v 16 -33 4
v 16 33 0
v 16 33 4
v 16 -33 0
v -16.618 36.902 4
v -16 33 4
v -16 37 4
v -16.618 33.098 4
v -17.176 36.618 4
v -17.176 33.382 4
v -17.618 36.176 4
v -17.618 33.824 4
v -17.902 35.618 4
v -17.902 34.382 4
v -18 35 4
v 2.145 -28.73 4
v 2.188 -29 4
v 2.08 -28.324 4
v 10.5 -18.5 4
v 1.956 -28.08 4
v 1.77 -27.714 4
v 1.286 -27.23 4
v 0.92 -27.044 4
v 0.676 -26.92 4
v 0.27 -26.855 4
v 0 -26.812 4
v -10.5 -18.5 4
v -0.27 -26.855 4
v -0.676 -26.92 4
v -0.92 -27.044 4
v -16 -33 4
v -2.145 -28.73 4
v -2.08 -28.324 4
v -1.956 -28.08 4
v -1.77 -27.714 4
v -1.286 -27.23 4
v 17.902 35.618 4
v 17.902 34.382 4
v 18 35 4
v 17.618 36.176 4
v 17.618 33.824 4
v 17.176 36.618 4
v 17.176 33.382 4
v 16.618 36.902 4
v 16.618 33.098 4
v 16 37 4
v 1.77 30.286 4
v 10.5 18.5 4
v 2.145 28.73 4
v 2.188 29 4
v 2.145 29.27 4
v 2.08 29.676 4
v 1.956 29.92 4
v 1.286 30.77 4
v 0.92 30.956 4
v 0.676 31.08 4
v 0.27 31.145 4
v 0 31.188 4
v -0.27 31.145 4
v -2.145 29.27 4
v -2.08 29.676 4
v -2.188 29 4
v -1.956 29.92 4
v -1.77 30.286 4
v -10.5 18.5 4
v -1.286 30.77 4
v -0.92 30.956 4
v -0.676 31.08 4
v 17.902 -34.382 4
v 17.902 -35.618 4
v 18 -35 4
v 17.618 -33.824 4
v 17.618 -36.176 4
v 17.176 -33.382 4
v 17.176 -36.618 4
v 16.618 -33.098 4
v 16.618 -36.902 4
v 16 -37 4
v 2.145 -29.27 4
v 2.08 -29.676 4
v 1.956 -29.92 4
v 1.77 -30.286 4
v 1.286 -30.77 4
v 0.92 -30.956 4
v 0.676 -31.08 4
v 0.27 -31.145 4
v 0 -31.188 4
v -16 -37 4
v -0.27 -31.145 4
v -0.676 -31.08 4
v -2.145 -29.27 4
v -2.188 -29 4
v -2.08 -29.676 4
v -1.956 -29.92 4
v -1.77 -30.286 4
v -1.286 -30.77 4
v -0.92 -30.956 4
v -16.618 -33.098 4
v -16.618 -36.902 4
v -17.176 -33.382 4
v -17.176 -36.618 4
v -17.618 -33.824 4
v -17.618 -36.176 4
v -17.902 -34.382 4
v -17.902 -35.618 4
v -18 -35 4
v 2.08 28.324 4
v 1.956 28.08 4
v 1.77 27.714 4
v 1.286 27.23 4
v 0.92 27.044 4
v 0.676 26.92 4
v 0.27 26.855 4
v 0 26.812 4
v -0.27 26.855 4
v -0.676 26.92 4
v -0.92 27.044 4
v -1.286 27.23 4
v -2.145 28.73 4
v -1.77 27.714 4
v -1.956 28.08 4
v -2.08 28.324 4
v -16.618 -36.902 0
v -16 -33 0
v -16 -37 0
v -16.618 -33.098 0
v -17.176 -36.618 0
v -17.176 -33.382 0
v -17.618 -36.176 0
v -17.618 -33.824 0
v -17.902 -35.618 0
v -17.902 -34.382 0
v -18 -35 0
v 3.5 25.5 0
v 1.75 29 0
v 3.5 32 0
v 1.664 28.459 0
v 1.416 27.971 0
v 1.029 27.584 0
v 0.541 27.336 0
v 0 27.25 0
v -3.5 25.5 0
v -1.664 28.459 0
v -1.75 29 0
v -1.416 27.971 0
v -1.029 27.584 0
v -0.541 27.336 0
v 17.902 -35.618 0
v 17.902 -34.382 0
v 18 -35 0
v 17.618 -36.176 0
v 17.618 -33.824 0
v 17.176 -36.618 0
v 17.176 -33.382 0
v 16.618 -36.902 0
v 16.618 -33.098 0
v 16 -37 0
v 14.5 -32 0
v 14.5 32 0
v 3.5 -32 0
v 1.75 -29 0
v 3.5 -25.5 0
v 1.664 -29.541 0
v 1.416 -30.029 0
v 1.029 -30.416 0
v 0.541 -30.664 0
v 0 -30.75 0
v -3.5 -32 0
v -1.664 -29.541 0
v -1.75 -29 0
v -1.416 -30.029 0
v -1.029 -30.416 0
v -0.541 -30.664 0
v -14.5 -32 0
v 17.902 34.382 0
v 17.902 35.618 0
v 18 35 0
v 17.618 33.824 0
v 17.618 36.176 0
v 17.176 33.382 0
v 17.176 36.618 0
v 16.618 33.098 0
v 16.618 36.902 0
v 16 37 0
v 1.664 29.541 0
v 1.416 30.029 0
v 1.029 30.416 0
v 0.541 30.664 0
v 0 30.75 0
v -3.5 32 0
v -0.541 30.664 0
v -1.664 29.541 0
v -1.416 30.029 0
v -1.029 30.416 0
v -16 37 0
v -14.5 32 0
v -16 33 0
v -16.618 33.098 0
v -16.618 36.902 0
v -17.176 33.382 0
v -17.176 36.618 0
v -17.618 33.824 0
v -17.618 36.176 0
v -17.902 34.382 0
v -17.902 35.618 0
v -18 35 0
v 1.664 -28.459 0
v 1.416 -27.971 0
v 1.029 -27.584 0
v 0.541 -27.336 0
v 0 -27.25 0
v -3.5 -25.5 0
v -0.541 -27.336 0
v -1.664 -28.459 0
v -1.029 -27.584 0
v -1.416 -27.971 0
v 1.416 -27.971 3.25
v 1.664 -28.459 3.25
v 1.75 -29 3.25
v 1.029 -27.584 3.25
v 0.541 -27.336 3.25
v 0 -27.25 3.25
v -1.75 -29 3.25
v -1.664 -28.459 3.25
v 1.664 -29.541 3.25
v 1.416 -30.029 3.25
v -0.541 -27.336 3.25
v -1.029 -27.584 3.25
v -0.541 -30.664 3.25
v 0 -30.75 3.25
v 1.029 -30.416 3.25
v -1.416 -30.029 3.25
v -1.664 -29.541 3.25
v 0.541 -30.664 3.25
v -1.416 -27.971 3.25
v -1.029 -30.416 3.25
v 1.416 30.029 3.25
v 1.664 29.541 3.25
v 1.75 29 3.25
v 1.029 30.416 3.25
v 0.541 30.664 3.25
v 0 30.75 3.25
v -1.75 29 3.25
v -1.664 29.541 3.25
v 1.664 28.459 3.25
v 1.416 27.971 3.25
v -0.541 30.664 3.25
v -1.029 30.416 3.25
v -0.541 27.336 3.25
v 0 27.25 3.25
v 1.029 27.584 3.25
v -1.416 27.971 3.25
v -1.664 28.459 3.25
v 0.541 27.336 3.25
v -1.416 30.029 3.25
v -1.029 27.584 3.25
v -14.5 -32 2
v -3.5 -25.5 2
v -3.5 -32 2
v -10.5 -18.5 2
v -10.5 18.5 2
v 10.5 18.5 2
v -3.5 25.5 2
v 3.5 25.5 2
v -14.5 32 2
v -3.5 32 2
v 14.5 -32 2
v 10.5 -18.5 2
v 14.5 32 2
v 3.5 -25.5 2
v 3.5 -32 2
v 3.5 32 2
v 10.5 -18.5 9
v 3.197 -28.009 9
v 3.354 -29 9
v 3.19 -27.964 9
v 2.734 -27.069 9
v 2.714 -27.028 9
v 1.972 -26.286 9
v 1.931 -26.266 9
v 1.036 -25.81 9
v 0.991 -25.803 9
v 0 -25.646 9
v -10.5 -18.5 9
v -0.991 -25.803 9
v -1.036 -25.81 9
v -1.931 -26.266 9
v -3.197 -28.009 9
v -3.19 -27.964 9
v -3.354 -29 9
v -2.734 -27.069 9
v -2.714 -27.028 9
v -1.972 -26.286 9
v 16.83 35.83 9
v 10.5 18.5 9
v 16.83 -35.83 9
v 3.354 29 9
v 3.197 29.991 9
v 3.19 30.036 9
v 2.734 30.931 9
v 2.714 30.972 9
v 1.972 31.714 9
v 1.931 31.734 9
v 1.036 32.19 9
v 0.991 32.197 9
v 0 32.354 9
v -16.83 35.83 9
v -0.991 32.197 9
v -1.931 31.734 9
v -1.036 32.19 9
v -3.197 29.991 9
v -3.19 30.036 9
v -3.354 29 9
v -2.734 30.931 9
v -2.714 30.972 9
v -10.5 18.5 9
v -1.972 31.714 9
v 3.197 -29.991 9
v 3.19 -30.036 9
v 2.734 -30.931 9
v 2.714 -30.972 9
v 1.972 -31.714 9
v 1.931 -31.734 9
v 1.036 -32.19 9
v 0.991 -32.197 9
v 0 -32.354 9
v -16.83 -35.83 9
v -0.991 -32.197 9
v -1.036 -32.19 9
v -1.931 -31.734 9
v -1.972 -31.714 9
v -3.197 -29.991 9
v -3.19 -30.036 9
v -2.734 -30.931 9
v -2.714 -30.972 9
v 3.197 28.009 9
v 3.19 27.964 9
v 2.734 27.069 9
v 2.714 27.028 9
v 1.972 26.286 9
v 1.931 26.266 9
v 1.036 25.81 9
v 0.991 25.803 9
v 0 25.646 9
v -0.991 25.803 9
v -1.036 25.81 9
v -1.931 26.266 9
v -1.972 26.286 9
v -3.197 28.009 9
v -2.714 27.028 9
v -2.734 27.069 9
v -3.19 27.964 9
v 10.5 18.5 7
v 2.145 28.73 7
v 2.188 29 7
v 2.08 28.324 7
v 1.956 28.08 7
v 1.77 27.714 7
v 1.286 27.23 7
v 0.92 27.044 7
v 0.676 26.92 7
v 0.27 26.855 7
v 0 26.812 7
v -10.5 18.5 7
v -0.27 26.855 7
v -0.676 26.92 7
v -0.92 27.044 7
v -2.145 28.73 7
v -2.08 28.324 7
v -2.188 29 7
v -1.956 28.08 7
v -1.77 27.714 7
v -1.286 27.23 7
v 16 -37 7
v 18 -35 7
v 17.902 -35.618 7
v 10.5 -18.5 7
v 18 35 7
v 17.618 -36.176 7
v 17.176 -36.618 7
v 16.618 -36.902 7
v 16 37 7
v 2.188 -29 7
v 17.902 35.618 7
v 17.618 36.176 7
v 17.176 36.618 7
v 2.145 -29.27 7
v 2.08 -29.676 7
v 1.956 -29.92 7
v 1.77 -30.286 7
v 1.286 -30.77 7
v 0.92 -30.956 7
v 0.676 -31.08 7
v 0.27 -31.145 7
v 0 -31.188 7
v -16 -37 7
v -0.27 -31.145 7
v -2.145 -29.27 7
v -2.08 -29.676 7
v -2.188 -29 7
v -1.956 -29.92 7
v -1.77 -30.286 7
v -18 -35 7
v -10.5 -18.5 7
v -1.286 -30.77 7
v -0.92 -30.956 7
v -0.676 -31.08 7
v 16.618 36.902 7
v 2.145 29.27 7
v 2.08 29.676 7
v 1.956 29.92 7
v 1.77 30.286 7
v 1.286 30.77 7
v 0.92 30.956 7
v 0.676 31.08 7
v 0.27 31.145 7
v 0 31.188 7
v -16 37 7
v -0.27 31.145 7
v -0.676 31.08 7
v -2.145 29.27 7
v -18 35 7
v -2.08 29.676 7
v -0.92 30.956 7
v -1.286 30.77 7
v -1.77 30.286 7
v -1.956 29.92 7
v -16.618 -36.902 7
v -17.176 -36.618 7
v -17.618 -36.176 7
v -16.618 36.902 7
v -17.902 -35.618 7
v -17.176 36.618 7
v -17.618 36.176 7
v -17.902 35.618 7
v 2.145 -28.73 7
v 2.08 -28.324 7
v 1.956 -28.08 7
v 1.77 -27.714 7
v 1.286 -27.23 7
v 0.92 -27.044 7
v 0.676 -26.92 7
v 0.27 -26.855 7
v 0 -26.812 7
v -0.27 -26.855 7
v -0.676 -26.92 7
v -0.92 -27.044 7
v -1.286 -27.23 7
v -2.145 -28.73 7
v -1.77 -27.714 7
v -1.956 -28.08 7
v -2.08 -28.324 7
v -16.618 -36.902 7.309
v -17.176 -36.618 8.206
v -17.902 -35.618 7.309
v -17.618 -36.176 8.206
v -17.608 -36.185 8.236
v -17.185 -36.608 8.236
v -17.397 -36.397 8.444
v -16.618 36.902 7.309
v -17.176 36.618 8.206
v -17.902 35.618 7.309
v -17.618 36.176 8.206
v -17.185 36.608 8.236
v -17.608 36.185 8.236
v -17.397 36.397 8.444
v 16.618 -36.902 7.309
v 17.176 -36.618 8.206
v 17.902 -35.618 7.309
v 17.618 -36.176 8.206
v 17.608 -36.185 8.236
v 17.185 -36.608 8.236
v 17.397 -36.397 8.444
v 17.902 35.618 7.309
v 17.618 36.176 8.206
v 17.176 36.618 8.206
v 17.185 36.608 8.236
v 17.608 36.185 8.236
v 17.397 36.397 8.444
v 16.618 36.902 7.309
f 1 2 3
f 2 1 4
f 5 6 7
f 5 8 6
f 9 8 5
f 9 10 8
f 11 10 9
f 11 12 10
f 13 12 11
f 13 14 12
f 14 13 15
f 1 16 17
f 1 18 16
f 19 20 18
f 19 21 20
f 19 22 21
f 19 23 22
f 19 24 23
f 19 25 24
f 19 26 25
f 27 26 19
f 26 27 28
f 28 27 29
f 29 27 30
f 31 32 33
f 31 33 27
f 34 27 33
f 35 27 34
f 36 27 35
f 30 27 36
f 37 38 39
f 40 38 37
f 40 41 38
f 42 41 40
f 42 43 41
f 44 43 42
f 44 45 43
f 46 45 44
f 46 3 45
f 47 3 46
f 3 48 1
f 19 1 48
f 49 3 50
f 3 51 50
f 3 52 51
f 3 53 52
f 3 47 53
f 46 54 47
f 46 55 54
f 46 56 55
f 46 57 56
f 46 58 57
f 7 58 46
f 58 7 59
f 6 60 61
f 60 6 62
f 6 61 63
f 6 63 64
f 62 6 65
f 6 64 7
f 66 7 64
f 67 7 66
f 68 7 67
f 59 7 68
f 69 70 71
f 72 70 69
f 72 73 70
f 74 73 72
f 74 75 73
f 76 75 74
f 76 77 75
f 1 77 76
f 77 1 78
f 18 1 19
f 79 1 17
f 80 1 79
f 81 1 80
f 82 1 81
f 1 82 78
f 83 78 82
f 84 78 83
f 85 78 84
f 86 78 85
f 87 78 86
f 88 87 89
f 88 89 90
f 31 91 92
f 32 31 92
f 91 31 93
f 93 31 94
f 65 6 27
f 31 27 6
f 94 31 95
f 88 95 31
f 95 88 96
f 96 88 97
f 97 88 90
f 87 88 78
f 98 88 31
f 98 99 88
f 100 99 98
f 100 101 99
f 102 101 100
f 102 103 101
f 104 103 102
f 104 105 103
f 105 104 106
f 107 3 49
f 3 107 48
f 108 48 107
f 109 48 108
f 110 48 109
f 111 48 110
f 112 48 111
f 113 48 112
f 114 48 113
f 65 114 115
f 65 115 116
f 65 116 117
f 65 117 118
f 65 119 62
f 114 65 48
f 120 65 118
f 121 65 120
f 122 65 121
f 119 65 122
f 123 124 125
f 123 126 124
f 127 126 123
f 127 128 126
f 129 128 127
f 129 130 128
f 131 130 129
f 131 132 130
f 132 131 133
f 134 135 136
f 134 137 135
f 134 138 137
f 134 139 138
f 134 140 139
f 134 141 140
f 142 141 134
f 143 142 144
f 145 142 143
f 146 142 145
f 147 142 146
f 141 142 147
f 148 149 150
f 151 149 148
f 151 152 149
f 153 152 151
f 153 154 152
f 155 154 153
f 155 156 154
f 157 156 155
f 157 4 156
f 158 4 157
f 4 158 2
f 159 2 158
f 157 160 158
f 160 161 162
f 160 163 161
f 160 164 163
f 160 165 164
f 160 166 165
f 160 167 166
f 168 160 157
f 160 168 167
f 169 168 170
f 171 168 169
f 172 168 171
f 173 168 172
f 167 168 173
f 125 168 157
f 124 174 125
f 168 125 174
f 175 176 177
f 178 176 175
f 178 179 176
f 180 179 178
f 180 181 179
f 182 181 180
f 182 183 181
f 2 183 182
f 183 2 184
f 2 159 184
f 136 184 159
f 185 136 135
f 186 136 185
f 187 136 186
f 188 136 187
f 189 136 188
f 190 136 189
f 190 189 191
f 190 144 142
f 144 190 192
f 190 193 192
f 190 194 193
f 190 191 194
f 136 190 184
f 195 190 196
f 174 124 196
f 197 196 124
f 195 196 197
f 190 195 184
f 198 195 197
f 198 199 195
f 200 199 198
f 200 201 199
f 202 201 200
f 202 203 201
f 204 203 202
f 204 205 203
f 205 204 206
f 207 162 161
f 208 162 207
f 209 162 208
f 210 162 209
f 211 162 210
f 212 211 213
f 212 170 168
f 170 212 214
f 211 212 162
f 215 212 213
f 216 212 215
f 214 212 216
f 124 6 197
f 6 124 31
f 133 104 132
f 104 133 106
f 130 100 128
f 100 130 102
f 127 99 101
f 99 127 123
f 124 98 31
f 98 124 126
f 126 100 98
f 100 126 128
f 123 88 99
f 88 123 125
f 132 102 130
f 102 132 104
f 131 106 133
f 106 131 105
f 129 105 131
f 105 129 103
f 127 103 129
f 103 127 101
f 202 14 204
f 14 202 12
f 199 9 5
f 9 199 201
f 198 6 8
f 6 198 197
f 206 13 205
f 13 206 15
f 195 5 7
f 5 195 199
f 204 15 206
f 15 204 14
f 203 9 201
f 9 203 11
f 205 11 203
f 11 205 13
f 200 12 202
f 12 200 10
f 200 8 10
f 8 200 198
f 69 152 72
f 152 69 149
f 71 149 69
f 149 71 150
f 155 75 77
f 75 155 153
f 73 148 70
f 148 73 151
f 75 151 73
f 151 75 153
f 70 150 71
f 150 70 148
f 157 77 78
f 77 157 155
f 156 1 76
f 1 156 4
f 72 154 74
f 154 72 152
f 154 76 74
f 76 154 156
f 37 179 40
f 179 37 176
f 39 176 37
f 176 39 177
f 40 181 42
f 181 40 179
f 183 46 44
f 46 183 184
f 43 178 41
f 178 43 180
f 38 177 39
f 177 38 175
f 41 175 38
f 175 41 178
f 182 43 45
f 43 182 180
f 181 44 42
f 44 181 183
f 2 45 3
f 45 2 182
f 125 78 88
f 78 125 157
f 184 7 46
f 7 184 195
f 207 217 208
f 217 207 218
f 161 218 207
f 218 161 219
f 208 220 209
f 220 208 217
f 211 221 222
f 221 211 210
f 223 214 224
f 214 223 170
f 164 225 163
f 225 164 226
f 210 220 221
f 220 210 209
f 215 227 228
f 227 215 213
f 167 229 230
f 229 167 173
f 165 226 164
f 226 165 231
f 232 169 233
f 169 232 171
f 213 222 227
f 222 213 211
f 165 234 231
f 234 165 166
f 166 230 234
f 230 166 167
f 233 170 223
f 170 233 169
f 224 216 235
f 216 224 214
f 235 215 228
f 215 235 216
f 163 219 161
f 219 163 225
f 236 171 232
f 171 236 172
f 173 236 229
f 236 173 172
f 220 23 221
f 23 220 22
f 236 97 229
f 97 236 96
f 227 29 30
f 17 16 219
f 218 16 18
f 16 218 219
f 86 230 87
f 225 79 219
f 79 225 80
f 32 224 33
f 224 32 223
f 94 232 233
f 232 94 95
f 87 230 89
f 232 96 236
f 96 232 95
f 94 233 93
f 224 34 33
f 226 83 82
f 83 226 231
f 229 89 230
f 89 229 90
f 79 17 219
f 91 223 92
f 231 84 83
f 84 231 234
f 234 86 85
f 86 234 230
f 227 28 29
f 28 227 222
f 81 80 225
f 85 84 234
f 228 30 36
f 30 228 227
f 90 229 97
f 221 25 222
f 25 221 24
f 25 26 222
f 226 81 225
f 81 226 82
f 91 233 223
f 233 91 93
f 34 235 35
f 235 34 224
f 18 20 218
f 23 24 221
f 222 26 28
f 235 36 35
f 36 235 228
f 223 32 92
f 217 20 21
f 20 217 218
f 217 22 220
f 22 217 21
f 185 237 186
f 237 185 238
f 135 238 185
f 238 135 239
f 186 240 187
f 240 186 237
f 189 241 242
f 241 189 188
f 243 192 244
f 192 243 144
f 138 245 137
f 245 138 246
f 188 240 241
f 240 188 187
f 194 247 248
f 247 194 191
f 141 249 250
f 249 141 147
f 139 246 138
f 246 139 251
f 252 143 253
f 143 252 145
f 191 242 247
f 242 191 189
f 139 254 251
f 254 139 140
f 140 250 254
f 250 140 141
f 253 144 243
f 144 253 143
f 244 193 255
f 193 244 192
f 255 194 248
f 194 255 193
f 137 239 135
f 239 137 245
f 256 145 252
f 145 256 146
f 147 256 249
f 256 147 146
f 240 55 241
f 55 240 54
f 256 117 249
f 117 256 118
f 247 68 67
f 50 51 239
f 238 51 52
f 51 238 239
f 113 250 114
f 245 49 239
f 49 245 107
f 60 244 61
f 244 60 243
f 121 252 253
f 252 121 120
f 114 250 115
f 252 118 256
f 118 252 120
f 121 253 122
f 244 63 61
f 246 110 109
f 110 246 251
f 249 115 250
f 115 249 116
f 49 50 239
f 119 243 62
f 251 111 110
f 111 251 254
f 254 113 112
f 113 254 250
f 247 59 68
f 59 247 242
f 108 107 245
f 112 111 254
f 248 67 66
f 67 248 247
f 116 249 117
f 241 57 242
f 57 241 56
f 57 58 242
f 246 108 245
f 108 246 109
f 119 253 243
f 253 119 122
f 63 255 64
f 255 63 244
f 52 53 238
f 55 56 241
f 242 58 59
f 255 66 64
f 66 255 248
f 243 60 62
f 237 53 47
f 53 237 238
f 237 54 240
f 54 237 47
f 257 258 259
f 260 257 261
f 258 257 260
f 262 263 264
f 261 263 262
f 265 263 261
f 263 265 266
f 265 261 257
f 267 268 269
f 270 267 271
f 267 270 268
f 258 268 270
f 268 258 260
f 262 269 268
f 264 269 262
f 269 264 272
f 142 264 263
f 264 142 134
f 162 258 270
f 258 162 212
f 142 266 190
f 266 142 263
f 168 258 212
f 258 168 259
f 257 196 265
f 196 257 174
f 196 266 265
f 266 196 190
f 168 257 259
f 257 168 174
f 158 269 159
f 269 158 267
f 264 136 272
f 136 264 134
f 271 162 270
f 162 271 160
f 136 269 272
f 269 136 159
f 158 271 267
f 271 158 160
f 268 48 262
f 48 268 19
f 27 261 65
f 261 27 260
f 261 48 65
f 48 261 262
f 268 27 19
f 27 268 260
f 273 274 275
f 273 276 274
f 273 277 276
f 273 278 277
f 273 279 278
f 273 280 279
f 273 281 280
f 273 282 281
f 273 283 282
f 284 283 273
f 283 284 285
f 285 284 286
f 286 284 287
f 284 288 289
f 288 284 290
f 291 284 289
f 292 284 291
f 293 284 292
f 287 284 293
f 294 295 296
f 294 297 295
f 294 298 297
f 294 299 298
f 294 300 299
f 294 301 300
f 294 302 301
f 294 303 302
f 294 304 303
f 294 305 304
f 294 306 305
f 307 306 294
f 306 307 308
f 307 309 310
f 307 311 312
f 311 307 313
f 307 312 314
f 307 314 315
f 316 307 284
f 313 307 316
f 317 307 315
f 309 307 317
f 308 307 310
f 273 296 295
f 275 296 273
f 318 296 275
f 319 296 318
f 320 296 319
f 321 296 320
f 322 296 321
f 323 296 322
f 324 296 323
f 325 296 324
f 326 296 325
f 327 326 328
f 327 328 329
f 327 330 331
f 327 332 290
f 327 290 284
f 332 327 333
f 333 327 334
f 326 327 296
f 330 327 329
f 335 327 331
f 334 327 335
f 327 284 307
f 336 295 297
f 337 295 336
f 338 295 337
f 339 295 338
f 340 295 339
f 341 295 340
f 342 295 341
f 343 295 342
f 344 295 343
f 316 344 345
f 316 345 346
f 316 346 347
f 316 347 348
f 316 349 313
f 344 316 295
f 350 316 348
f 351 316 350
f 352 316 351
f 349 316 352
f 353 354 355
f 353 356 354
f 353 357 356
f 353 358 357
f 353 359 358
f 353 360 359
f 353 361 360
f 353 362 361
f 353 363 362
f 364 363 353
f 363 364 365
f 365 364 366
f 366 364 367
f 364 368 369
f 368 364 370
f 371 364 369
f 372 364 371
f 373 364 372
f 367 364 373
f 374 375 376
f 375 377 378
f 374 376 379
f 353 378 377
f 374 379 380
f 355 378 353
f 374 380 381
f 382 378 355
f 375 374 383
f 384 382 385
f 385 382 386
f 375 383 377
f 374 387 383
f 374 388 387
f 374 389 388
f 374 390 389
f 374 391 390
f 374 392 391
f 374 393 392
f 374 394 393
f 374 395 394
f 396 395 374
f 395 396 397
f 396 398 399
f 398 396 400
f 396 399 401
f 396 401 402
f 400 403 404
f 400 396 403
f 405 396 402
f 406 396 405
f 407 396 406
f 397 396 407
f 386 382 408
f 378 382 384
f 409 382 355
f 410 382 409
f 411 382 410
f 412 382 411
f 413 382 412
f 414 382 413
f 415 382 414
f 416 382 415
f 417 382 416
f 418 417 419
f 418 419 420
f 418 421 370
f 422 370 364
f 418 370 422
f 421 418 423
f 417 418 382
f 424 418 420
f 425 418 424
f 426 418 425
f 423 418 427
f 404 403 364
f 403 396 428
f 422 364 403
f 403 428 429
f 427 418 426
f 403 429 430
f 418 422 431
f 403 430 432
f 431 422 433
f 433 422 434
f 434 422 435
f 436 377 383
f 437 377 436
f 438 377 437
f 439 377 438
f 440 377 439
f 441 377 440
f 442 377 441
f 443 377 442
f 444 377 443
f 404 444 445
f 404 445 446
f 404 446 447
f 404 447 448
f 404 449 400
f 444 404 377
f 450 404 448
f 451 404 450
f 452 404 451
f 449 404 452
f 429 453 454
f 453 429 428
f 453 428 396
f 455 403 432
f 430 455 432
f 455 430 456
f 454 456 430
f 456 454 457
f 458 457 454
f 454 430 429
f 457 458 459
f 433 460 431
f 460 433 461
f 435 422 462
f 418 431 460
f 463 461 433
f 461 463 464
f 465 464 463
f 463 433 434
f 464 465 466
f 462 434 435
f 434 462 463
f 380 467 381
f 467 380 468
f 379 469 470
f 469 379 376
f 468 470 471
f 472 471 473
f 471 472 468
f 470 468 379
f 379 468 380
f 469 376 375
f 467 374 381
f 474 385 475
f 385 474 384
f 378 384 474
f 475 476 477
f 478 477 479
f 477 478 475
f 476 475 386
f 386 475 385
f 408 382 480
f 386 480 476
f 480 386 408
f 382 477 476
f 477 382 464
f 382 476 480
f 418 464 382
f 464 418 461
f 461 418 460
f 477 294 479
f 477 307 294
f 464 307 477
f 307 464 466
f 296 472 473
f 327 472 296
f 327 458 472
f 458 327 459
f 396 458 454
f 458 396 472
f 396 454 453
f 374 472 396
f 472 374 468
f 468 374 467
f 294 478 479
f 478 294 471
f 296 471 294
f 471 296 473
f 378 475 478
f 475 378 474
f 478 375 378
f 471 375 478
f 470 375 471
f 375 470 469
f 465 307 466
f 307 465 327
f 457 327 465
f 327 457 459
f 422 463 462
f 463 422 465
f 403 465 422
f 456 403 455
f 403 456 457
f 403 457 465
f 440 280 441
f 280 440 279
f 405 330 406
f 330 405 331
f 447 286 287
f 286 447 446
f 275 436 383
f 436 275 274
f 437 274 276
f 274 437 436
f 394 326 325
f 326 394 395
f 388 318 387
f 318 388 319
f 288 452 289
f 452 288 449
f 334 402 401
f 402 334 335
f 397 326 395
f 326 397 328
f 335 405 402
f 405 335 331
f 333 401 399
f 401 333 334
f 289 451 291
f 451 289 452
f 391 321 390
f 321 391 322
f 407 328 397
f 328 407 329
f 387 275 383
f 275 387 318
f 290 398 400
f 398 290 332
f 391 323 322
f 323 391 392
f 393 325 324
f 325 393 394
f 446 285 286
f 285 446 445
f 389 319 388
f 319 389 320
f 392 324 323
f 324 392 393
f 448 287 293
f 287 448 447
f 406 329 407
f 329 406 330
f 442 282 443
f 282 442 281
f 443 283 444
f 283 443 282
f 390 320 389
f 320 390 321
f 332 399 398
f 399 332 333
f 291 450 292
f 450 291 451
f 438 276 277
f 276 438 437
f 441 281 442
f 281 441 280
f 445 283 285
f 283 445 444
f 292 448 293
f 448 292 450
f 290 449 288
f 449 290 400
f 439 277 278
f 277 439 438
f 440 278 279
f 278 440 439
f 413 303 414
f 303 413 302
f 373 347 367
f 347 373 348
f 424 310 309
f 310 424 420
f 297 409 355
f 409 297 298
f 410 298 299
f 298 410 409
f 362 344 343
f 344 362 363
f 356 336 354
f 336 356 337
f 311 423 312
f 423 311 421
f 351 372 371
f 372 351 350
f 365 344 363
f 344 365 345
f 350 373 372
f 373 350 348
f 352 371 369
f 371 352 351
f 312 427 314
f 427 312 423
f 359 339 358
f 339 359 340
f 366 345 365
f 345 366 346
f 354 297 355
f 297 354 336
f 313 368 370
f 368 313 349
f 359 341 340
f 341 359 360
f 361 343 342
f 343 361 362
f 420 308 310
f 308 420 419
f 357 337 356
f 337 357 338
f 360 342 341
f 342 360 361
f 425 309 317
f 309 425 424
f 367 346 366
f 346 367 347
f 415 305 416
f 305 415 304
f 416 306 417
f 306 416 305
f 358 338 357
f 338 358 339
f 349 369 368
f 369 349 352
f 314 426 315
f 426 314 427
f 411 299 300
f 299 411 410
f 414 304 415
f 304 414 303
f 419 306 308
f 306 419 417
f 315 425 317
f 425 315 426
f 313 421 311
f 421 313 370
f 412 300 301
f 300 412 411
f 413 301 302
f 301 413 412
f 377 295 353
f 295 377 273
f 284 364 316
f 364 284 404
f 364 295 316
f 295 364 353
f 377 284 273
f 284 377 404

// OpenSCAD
// CC-BY-SA Olivier Boyaval
// Swith plate for shutter
//
//    TOP part :
//           width
//    +-----------------+
//    !                 !
//    !        O        ! screw hole (if vertical)
//    !                 !
//    !    +-------+    !
//    !    !       !    !
//    !    ! switch!    !
//    !    ! hole  !    !  height
//    !    !       !    !
//    !    !       !    !
//    !    +-------+    !
//    !                 !
//    !        O        ! screw hole (if vertical)
//    !                 !
//    +-----------------+
//
//    BOTTOM part :
//    +-----------------+
//    ++               ++
//     !       O       !
//     !               !
//     !   +-------+   !
//     !   !       !   !
//     !   !       !   !
//     !   !       !   !
//     !   !       !   !
//     !   !       !   !
//     !   +-------+   !
//     !               !
//     !       O       !
//    ++               ++
//    +-----------------+
//
//Parameters for switch plate in 2 parts (top and bottom parts)
//measurements in mm

/* [Plate size] */
// Width (mm)
plateWidth              = 36;
// Height (mm)
plateHeight             = 74;

/* [Plate Thickness] */
// Top part (mm)
thicknessTop            = 2;
// Bottom part
thicknessBottom         = 4;

/* [Screw holes) */
// spacing beetwen center screw holes (mm)
screwSpacing            = 58;
//hole size (mm)
screwDiameter           = 3.5;
// Axe for screw holes
screwHoleAxe            = "Vertical"; //[Vertical,Horizontal]

/* [Switch hole size] */
// switch width (mm)
switchWidth             = 21;
// switch height (mm)
switchHeight            = 37;

// screw hole size and chamfer
module screwHole(diameter,depth) {
    union () {
        translate([0,0,-0.25]) cylinder(h=depth+0.5, d=diameter, $fn=20);
        translate([0,0,depth/2+0.25]) cylinder(h=depth/2, d1=diameter, d2=2*diameter, $fn=20);
    }
}

// bottom part (basic shape)
module basicShapeBottomPart (width,height,thickness) {
    union () {
        translate([-width/2+2,-height/2+2,0]) cube([width-4,height-4,thickness]);
        translate([-width/2+2,-height/2+2,0]) cylinder(h=thickness, d=4, $fn=20);
        translate([-width/2+2,+height/2-2,0]) cylinder(h=thickness, d=4, $fn=20);
        translate([+width/2-2,-height/2+2,0]) cylinder(h=thickness, d=4, $fn=20);
        translate([+width/2-2,+height/2-2,0]) cylinder(h=thickness, d=4, $fn=20);
        translate([-width/2+2,-height/2,0]) cube([width-4,4,thickness]);
        translate([-width/2+2,+height/2-4,0]) cube([width-4,4,thickness]);
        *translate([-width/2,-height/2+2,0]) cube([4,height-4,thickness]);
        *translate([+width/2-4,-height/2+2,0]) cube([4,height-4,thickness]);
    }
}

// Top part (basic shape)
module basicShapeTopPart (width,height,thickness) {
    chamfer=thickness*4;
intersection () {
intersection () {
    union () {
        translate([-width/2+2,-height/2+2,0]) cube([width-4,height-4,thickness]);
        translate([-width/2+2,-height/2+2,0]) cylinder(h=thickness, d=4, $fn=20);
        translate([-width/2+2,+height/2-2,0]) cylinder(h=thickness, d=4, $fn=20);
        translate([+width/2-2,-height/2+2,0]) cylinder(h=thickness, d=4, $fn=20);
        translate([+width/2-2,+height/2-2,0]) cylinder(h=thickness, d=4, $fn=20);
        translate([-width/2+2,-height/2,0]) cube([width-4,4,thickness]);
        translate([-width/2+2,+height/2-4,0]) cube([width-4,4,thickness]);
        translate([-width/2,-height/2+2,0]) cube([4,height-4,thickness]);
        translate([+width/2-4,-height/2+2,0]) cube([4,height-4,thickness]);
    }
    union () {
        translate([-width/2-2,+height/2-chamfer,0]) rotate([0,+90,0]) scale([1,2,1]) cylinder(h=width+4, d=chamfer, $fn=20);
        translate([-width/2-2,-height/2+chamfer,0]) rotate([0,+90,0]) scale([1,2,1]) cylinder(h=width+4, d=chamfer, $fn=20);
        translate([-width/2,-height/2+2,0]) cube([width,height-chamfer/2,chamfer/2]);
    }
}
    union () {
        translate([+width/2-chamfer,-height/2-2,0]) rotate([-90,-90,0]) scale([1,2,1]) cylinder(h=height+4, d=chamfer, $fn=20);
        translate([-width/2+chamfer,-height/2-2,0]) rotate([-90,-90,0]) scale([1,2,1]) cylinder(h=height+4, d=chamfer, $fn=20);
        translate([-width/2+2,-height/2,0]) cube([width-chamfer/2,height,chamfer/2]);
    }
}
}

module bottomPlate(width,height,thicknessI,thicknessS,screwD,screwE,widthI,heightI) {
    difference () {
        basicShapeBottomPart(width,height,thicknessI);
        union () {
            if (screwHoleAxe=="Vertical") {
                translate ([0,-screwE/2,0]) screwHole(screwD, thicknessI+thicknessS);
                translate ([0,+screwE/2,0]) screwHole(screwD, thicknessI+thicknessS);
                translate([-width/2+5,-(screwE-2*screwD)/2,-thicknessI/2]) cube([width-10,screwE-2*screwD,thicknessI]);
                translate([-width/2+screwD,-height/2+5,-thicknessI/2]) cube([width/2-2*screwD,height-10,thicknessI]);
                translate([screwD,-height/2+5,-thicknessI/2]) cube([width/2-2*screwD,height-10,thicknessI]);
            } else {
                translate ([-screwE/2,0,0]) screwHole(screwD, thicknessI+thicknessS);
                translate ([+screwE/2,0,0]) screwHole(screwD, thicknessI+thicknessS);
                translate([-(screwE-2*screwD)/2,-height/2+5,-thicknessI/2]) cube([screwE-2*screwD,height-10,thicknessI]);
               translate([-width/2+5,-height/2+screwD,-thicknessI/2]) 
    cube([width-10,height/2-2*screwD,thicknessI]);
                translate([-width/2+5,screwD,-thicknessI/2]) cube([width-10,height/2-2*screwD,thicknessI]);
            }
            
            // switch hole
            translate([-widthI/2,-heightI/2,-10]) cube([widthI,heightI,20]);
        }
    }    
}

module topPlate(width,height,thicknessI,thicknessS,screwD,screwE,widthI,heightI) {
    difference () {
        basicShapeTopPart(width,height,thicknessS);
        union () {
            if (screwHoleAxe=="Vertical") {
                translate ([0,-screwE/2,-thicknessI]) screwHole(screwD, thicknessI+thicknessS);
                translate ([0,+screwE/2,-thicknessI]) screwHole(screwD, thicknessI+thicknessS);
            } else {
                translate ([-screwE/2,0,-thicknessI]) screwHole(screwD, thicknessI+thicknessS);
                translate ([+screwE/2,0,-thicknessI]) screwHole(screwD, thicknessI+thicknessS);
            }
            // switch hole
            translate([-widthI/2,-heightI/2,-10]) cube([widthI,heightI,20]);
        }
    }
}

//Test
color("Wheat") bottomPlate(plateWidth,plateHeight,thicknessBottom,thicknessTop,screwDiameter, screwSpacing,switchWidth,switchHeight);
translate ([0,0,thicknessBottom+3]) color("Sienna") topPlate(plateWidth,plateHeight,thicknessBottom,thicknessTop,screwDiameter, screwSpacing,switchWidth,switchHeight);

// To render STL object of bottom plate part
//translate ([0,0,thicknessBottom]) rotate([0,180,0]) 
*bottomPlate(plateWidth,plateHeight,thicknessBottom,thicknessTop,screwDiameter, screwSpacing,switchWidth,switchHeight);

// To render STL object of top plate part
*topPlate(plateWidth,plateHeight,thicknessBottom,thicknessTop,screwDiameter, screwSpacing,switchWidth,switchHeight);
